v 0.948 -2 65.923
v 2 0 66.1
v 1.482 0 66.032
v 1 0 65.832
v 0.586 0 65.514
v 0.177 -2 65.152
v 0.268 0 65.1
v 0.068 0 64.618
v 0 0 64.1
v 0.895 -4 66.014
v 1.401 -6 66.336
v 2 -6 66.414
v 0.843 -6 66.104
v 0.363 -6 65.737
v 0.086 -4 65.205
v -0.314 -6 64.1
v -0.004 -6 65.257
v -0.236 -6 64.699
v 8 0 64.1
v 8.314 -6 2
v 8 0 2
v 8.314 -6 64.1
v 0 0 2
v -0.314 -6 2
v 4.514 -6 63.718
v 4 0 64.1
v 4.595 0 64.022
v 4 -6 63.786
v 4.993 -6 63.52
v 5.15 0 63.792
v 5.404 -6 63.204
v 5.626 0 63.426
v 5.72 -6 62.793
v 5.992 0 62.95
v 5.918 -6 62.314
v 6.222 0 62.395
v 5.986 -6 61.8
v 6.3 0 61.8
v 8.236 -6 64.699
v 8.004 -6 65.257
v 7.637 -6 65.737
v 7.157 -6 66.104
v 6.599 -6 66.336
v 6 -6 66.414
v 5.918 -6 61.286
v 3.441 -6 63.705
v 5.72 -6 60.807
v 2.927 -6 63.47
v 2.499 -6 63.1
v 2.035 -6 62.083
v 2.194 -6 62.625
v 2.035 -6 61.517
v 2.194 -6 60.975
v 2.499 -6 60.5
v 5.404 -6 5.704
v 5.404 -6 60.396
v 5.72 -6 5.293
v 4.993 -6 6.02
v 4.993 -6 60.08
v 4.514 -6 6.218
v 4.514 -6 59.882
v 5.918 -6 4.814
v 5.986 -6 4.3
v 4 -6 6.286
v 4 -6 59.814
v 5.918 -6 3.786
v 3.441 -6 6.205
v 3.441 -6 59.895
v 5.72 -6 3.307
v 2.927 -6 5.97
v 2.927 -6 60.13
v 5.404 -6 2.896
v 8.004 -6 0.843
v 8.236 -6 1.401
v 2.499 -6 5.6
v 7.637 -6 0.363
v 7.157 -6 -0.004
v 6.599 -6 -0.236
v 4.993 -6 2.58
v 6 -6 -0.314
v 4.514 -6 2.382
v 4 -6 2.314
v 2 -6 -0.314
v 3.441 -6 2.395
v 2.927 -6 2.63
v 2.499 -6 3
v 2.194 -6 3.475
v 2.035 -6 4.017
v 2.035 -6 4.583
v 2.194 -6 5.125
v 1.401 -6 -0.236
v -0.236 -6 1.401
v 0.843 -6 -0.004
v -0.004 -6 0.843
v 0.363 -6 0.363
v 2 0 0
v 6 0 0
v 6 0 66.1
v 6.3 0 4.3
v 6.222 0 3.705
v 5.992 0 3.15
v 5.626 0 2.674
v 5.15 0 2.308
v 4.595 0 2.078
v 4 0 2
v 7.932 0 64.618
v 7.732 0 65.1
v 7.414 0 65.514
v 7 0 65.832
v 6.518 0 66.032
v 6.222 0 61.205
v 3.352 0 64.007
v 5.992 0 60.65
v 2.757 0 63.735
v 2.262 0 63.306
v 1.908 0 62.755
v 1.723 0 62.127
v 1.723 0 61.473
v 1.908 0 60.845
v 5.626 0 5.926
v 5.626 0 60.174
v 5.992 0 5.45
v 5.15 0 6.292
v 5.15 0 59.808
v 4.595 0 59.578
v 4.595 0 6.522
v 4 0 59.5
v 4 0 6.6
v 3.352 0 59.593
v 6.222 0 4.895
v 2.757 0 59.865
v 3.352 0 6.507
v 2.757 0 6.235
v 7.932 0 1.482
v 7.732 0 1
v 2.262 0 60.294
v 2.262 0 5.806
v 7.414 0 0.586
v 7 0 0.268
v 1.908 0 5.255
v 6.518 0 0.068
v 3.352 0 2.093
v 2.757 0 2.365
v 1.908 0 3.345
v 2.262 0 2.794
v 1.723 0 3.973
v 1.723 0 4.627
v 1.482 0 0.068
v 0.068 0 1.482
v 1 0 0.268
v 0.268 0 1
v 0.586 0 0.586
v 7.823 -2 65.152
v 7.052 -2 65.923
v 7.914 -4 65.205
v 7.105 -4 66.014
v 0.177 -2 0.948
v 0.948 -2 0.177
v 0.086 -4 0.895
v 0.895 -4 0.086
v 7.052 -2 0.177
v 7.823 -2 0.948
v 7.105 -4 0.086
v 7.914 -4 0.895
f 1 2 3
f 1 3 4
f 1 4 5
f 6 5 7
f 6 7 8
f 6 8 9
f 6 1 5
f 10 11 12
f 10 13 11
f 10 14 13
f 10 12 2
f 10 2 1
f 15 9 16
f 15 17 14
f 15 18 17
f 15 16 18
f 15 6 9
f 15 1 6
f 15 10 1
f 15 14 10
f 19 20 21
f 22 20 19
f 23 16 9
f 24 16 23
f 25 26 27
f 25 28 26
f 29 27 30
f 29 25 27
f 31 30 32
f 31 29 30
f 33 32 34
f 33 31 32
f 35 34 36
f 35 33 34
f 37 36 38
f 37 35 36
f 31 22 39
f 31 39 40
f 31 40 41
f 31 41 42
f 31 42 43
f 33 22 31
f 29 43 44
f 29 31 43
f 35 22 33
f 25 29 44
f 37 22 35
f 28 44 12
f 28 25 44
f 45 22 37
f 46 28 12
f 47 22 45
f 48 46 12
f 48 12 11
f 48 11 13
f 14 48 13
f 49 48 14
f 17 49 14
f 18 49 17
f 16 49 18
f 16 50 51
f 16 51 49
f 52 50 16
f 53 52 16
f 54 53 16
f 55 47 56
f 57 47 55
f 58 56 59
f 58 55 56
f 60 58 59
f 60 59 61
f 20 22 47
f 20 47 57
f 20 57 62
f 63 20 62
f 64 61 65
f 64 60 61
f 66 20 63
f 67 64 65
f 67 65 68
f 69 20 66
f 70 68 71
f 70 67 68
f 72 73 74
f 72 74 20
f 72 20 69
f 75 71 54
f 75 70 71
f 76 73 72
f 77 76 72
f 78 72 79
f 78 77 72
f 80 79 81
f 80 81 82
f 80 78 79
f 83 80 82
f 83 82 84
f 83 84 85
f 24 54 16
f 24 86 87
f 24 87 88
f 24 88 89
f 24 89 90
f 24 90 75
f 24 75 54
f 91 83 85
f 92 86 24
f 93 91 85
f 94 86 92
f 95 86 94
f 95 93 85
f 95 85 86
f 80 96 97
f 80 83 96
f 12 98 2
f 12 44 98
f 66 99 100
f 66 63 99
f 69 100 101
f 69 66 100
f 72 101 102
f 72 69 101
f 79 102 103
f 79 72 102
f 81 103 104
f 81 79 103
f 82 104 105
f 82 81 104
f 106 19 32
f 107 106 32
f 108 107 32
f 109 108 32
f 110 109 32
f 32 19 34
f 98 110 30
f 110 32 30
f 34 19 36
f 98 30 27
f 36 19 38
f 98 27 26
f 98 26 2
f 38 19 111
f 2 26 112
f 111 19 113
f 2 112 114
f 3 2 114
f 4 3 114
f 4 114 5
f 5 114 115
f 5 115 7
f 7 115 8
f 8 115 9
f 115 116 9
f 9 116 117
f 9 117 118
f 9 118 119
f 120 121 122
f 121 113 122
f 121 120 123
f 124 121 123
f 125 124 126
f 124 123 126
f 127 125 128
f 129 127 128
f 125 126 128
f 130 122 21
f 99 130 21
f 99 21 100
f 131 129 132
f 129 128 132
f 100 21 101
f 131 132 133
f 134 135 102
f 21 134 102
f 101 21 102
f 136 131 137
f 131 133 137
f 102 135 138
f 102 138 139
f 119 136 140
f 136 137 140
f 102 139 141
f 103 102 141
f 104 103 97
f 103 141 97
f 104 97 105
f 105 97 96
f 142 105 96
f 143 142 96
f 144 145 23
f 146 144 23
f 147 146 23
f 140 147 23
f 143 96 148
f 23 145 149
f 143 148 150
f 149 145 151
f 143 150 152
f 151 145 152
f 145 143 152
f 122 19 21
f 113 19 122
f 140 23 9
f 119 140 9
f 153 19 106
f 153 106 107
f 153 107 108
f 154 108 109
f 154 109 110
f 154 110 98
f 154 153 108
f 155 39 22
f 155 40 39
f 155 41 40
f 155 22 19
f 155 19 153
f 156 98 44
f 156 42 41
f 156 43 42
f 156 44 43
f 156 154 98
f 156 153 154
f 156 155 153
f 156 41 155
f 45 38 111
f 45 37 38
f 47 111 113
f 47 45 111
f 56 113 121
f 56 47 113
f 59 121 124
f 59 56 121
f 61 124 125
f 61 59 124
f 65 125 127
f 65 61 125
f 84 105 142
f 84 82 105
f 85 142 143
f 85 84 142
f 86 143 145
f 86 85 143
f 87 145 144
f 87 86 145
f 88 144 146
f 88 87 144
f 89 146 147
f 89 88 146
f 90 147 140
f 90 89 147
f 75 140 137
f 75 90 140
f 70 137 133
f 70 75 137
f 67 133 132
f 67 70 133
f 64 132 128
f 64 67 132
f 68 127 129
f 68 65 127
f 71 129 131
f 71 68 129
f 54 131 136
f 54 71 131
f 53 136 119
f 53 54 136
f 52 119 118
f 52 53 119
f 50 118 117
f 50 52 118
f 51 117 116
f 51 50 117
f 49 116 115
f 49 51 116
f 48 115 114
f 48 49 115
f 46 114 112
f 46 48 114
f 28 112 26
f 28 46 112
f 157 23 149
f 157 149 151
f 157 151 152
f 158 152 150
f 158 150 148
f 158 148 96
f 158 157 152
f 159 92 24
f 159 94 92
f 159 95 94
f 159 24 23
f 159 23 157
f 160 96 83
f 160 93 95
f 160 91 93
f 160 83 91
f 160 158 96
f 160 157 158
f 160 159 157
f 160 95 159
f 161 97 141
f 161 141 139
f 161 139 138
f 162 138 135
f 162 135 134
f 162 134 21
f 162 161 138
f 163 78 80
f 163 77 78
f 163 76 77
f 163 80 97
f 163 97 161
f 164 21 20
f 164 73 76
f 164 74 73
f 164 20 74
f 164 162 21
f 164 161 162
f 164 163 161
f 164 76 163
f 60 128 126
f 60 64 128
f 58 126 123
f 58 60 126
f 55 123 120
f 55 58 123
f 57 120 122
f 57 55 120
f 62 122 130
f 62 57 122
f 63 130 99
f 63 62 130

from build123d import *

# Parameters (mm, degrees)
F1_DEPTH = 6
F1_TAPER = -3


with BuildPart() as f1:
    # F0 (on Front) → F1 (new body)
    with BuildSketch(Plane.XZ):
        with BuildLine():
            ThreePointArc((0, 2), (0.5857864376, 0.5857864376), (2, 0))
            Line((2, 0), (4, 0))
            Line((4, 0), (4, 2))
            ThreePointArc((4, 2), (1.7, 4.3), (4, 6.6))
            Line((4, 6.6), (4, 59.5))
            ThreePointArc((4, 59.5), (1.7, 61.8), (4, 64.1))
            Line((4, 64.1), (4, 66.1))
            Line((4, 66.1), (2, 66.1))
            ThreePointArc((2, 66.1), (0.5857864376, 65.5142135624), (0, 64.1))
            Line((0, 64.1), (0, 2))
        make_face()
        with BuildLine():
            Line((4, 2), (4, 0))
            Line((4, 0), (6, 0))
            ThreePointArc((6, 0), (7.4142135624, 0.5857864376), (8, 2))
            Line((8, 2), (8, 64.1))
            ThreePointArc((8, 64.1), (7.4142135624, 65.5142135624), (6, 66.1))
            Line((6, 66.1), (4, 66.1))
            Line((4, 66.1), (4, 64.1))
            ThreePointArc((4, 64.1), (5.6263455967, 63.4263455967), (6.3, 61.8))
            ThreePointArc((6.3, 61.8), (5.6263455967, 60.1736544033), (4, 59.5))
            Line((4, 59.5), (4, 6.6))
            ThreePointArc((4, 6.6), (5.6263455967, 5.9263455967), (6.3, 4.3))
            ThreePointArc((6.3, 4.3), (5.6263455967, 2.6736544033), (4, 2))
        make_face()
    extrude(amount=F1_DEPTH, taper=F1_TAPER)


solid = f1.part
